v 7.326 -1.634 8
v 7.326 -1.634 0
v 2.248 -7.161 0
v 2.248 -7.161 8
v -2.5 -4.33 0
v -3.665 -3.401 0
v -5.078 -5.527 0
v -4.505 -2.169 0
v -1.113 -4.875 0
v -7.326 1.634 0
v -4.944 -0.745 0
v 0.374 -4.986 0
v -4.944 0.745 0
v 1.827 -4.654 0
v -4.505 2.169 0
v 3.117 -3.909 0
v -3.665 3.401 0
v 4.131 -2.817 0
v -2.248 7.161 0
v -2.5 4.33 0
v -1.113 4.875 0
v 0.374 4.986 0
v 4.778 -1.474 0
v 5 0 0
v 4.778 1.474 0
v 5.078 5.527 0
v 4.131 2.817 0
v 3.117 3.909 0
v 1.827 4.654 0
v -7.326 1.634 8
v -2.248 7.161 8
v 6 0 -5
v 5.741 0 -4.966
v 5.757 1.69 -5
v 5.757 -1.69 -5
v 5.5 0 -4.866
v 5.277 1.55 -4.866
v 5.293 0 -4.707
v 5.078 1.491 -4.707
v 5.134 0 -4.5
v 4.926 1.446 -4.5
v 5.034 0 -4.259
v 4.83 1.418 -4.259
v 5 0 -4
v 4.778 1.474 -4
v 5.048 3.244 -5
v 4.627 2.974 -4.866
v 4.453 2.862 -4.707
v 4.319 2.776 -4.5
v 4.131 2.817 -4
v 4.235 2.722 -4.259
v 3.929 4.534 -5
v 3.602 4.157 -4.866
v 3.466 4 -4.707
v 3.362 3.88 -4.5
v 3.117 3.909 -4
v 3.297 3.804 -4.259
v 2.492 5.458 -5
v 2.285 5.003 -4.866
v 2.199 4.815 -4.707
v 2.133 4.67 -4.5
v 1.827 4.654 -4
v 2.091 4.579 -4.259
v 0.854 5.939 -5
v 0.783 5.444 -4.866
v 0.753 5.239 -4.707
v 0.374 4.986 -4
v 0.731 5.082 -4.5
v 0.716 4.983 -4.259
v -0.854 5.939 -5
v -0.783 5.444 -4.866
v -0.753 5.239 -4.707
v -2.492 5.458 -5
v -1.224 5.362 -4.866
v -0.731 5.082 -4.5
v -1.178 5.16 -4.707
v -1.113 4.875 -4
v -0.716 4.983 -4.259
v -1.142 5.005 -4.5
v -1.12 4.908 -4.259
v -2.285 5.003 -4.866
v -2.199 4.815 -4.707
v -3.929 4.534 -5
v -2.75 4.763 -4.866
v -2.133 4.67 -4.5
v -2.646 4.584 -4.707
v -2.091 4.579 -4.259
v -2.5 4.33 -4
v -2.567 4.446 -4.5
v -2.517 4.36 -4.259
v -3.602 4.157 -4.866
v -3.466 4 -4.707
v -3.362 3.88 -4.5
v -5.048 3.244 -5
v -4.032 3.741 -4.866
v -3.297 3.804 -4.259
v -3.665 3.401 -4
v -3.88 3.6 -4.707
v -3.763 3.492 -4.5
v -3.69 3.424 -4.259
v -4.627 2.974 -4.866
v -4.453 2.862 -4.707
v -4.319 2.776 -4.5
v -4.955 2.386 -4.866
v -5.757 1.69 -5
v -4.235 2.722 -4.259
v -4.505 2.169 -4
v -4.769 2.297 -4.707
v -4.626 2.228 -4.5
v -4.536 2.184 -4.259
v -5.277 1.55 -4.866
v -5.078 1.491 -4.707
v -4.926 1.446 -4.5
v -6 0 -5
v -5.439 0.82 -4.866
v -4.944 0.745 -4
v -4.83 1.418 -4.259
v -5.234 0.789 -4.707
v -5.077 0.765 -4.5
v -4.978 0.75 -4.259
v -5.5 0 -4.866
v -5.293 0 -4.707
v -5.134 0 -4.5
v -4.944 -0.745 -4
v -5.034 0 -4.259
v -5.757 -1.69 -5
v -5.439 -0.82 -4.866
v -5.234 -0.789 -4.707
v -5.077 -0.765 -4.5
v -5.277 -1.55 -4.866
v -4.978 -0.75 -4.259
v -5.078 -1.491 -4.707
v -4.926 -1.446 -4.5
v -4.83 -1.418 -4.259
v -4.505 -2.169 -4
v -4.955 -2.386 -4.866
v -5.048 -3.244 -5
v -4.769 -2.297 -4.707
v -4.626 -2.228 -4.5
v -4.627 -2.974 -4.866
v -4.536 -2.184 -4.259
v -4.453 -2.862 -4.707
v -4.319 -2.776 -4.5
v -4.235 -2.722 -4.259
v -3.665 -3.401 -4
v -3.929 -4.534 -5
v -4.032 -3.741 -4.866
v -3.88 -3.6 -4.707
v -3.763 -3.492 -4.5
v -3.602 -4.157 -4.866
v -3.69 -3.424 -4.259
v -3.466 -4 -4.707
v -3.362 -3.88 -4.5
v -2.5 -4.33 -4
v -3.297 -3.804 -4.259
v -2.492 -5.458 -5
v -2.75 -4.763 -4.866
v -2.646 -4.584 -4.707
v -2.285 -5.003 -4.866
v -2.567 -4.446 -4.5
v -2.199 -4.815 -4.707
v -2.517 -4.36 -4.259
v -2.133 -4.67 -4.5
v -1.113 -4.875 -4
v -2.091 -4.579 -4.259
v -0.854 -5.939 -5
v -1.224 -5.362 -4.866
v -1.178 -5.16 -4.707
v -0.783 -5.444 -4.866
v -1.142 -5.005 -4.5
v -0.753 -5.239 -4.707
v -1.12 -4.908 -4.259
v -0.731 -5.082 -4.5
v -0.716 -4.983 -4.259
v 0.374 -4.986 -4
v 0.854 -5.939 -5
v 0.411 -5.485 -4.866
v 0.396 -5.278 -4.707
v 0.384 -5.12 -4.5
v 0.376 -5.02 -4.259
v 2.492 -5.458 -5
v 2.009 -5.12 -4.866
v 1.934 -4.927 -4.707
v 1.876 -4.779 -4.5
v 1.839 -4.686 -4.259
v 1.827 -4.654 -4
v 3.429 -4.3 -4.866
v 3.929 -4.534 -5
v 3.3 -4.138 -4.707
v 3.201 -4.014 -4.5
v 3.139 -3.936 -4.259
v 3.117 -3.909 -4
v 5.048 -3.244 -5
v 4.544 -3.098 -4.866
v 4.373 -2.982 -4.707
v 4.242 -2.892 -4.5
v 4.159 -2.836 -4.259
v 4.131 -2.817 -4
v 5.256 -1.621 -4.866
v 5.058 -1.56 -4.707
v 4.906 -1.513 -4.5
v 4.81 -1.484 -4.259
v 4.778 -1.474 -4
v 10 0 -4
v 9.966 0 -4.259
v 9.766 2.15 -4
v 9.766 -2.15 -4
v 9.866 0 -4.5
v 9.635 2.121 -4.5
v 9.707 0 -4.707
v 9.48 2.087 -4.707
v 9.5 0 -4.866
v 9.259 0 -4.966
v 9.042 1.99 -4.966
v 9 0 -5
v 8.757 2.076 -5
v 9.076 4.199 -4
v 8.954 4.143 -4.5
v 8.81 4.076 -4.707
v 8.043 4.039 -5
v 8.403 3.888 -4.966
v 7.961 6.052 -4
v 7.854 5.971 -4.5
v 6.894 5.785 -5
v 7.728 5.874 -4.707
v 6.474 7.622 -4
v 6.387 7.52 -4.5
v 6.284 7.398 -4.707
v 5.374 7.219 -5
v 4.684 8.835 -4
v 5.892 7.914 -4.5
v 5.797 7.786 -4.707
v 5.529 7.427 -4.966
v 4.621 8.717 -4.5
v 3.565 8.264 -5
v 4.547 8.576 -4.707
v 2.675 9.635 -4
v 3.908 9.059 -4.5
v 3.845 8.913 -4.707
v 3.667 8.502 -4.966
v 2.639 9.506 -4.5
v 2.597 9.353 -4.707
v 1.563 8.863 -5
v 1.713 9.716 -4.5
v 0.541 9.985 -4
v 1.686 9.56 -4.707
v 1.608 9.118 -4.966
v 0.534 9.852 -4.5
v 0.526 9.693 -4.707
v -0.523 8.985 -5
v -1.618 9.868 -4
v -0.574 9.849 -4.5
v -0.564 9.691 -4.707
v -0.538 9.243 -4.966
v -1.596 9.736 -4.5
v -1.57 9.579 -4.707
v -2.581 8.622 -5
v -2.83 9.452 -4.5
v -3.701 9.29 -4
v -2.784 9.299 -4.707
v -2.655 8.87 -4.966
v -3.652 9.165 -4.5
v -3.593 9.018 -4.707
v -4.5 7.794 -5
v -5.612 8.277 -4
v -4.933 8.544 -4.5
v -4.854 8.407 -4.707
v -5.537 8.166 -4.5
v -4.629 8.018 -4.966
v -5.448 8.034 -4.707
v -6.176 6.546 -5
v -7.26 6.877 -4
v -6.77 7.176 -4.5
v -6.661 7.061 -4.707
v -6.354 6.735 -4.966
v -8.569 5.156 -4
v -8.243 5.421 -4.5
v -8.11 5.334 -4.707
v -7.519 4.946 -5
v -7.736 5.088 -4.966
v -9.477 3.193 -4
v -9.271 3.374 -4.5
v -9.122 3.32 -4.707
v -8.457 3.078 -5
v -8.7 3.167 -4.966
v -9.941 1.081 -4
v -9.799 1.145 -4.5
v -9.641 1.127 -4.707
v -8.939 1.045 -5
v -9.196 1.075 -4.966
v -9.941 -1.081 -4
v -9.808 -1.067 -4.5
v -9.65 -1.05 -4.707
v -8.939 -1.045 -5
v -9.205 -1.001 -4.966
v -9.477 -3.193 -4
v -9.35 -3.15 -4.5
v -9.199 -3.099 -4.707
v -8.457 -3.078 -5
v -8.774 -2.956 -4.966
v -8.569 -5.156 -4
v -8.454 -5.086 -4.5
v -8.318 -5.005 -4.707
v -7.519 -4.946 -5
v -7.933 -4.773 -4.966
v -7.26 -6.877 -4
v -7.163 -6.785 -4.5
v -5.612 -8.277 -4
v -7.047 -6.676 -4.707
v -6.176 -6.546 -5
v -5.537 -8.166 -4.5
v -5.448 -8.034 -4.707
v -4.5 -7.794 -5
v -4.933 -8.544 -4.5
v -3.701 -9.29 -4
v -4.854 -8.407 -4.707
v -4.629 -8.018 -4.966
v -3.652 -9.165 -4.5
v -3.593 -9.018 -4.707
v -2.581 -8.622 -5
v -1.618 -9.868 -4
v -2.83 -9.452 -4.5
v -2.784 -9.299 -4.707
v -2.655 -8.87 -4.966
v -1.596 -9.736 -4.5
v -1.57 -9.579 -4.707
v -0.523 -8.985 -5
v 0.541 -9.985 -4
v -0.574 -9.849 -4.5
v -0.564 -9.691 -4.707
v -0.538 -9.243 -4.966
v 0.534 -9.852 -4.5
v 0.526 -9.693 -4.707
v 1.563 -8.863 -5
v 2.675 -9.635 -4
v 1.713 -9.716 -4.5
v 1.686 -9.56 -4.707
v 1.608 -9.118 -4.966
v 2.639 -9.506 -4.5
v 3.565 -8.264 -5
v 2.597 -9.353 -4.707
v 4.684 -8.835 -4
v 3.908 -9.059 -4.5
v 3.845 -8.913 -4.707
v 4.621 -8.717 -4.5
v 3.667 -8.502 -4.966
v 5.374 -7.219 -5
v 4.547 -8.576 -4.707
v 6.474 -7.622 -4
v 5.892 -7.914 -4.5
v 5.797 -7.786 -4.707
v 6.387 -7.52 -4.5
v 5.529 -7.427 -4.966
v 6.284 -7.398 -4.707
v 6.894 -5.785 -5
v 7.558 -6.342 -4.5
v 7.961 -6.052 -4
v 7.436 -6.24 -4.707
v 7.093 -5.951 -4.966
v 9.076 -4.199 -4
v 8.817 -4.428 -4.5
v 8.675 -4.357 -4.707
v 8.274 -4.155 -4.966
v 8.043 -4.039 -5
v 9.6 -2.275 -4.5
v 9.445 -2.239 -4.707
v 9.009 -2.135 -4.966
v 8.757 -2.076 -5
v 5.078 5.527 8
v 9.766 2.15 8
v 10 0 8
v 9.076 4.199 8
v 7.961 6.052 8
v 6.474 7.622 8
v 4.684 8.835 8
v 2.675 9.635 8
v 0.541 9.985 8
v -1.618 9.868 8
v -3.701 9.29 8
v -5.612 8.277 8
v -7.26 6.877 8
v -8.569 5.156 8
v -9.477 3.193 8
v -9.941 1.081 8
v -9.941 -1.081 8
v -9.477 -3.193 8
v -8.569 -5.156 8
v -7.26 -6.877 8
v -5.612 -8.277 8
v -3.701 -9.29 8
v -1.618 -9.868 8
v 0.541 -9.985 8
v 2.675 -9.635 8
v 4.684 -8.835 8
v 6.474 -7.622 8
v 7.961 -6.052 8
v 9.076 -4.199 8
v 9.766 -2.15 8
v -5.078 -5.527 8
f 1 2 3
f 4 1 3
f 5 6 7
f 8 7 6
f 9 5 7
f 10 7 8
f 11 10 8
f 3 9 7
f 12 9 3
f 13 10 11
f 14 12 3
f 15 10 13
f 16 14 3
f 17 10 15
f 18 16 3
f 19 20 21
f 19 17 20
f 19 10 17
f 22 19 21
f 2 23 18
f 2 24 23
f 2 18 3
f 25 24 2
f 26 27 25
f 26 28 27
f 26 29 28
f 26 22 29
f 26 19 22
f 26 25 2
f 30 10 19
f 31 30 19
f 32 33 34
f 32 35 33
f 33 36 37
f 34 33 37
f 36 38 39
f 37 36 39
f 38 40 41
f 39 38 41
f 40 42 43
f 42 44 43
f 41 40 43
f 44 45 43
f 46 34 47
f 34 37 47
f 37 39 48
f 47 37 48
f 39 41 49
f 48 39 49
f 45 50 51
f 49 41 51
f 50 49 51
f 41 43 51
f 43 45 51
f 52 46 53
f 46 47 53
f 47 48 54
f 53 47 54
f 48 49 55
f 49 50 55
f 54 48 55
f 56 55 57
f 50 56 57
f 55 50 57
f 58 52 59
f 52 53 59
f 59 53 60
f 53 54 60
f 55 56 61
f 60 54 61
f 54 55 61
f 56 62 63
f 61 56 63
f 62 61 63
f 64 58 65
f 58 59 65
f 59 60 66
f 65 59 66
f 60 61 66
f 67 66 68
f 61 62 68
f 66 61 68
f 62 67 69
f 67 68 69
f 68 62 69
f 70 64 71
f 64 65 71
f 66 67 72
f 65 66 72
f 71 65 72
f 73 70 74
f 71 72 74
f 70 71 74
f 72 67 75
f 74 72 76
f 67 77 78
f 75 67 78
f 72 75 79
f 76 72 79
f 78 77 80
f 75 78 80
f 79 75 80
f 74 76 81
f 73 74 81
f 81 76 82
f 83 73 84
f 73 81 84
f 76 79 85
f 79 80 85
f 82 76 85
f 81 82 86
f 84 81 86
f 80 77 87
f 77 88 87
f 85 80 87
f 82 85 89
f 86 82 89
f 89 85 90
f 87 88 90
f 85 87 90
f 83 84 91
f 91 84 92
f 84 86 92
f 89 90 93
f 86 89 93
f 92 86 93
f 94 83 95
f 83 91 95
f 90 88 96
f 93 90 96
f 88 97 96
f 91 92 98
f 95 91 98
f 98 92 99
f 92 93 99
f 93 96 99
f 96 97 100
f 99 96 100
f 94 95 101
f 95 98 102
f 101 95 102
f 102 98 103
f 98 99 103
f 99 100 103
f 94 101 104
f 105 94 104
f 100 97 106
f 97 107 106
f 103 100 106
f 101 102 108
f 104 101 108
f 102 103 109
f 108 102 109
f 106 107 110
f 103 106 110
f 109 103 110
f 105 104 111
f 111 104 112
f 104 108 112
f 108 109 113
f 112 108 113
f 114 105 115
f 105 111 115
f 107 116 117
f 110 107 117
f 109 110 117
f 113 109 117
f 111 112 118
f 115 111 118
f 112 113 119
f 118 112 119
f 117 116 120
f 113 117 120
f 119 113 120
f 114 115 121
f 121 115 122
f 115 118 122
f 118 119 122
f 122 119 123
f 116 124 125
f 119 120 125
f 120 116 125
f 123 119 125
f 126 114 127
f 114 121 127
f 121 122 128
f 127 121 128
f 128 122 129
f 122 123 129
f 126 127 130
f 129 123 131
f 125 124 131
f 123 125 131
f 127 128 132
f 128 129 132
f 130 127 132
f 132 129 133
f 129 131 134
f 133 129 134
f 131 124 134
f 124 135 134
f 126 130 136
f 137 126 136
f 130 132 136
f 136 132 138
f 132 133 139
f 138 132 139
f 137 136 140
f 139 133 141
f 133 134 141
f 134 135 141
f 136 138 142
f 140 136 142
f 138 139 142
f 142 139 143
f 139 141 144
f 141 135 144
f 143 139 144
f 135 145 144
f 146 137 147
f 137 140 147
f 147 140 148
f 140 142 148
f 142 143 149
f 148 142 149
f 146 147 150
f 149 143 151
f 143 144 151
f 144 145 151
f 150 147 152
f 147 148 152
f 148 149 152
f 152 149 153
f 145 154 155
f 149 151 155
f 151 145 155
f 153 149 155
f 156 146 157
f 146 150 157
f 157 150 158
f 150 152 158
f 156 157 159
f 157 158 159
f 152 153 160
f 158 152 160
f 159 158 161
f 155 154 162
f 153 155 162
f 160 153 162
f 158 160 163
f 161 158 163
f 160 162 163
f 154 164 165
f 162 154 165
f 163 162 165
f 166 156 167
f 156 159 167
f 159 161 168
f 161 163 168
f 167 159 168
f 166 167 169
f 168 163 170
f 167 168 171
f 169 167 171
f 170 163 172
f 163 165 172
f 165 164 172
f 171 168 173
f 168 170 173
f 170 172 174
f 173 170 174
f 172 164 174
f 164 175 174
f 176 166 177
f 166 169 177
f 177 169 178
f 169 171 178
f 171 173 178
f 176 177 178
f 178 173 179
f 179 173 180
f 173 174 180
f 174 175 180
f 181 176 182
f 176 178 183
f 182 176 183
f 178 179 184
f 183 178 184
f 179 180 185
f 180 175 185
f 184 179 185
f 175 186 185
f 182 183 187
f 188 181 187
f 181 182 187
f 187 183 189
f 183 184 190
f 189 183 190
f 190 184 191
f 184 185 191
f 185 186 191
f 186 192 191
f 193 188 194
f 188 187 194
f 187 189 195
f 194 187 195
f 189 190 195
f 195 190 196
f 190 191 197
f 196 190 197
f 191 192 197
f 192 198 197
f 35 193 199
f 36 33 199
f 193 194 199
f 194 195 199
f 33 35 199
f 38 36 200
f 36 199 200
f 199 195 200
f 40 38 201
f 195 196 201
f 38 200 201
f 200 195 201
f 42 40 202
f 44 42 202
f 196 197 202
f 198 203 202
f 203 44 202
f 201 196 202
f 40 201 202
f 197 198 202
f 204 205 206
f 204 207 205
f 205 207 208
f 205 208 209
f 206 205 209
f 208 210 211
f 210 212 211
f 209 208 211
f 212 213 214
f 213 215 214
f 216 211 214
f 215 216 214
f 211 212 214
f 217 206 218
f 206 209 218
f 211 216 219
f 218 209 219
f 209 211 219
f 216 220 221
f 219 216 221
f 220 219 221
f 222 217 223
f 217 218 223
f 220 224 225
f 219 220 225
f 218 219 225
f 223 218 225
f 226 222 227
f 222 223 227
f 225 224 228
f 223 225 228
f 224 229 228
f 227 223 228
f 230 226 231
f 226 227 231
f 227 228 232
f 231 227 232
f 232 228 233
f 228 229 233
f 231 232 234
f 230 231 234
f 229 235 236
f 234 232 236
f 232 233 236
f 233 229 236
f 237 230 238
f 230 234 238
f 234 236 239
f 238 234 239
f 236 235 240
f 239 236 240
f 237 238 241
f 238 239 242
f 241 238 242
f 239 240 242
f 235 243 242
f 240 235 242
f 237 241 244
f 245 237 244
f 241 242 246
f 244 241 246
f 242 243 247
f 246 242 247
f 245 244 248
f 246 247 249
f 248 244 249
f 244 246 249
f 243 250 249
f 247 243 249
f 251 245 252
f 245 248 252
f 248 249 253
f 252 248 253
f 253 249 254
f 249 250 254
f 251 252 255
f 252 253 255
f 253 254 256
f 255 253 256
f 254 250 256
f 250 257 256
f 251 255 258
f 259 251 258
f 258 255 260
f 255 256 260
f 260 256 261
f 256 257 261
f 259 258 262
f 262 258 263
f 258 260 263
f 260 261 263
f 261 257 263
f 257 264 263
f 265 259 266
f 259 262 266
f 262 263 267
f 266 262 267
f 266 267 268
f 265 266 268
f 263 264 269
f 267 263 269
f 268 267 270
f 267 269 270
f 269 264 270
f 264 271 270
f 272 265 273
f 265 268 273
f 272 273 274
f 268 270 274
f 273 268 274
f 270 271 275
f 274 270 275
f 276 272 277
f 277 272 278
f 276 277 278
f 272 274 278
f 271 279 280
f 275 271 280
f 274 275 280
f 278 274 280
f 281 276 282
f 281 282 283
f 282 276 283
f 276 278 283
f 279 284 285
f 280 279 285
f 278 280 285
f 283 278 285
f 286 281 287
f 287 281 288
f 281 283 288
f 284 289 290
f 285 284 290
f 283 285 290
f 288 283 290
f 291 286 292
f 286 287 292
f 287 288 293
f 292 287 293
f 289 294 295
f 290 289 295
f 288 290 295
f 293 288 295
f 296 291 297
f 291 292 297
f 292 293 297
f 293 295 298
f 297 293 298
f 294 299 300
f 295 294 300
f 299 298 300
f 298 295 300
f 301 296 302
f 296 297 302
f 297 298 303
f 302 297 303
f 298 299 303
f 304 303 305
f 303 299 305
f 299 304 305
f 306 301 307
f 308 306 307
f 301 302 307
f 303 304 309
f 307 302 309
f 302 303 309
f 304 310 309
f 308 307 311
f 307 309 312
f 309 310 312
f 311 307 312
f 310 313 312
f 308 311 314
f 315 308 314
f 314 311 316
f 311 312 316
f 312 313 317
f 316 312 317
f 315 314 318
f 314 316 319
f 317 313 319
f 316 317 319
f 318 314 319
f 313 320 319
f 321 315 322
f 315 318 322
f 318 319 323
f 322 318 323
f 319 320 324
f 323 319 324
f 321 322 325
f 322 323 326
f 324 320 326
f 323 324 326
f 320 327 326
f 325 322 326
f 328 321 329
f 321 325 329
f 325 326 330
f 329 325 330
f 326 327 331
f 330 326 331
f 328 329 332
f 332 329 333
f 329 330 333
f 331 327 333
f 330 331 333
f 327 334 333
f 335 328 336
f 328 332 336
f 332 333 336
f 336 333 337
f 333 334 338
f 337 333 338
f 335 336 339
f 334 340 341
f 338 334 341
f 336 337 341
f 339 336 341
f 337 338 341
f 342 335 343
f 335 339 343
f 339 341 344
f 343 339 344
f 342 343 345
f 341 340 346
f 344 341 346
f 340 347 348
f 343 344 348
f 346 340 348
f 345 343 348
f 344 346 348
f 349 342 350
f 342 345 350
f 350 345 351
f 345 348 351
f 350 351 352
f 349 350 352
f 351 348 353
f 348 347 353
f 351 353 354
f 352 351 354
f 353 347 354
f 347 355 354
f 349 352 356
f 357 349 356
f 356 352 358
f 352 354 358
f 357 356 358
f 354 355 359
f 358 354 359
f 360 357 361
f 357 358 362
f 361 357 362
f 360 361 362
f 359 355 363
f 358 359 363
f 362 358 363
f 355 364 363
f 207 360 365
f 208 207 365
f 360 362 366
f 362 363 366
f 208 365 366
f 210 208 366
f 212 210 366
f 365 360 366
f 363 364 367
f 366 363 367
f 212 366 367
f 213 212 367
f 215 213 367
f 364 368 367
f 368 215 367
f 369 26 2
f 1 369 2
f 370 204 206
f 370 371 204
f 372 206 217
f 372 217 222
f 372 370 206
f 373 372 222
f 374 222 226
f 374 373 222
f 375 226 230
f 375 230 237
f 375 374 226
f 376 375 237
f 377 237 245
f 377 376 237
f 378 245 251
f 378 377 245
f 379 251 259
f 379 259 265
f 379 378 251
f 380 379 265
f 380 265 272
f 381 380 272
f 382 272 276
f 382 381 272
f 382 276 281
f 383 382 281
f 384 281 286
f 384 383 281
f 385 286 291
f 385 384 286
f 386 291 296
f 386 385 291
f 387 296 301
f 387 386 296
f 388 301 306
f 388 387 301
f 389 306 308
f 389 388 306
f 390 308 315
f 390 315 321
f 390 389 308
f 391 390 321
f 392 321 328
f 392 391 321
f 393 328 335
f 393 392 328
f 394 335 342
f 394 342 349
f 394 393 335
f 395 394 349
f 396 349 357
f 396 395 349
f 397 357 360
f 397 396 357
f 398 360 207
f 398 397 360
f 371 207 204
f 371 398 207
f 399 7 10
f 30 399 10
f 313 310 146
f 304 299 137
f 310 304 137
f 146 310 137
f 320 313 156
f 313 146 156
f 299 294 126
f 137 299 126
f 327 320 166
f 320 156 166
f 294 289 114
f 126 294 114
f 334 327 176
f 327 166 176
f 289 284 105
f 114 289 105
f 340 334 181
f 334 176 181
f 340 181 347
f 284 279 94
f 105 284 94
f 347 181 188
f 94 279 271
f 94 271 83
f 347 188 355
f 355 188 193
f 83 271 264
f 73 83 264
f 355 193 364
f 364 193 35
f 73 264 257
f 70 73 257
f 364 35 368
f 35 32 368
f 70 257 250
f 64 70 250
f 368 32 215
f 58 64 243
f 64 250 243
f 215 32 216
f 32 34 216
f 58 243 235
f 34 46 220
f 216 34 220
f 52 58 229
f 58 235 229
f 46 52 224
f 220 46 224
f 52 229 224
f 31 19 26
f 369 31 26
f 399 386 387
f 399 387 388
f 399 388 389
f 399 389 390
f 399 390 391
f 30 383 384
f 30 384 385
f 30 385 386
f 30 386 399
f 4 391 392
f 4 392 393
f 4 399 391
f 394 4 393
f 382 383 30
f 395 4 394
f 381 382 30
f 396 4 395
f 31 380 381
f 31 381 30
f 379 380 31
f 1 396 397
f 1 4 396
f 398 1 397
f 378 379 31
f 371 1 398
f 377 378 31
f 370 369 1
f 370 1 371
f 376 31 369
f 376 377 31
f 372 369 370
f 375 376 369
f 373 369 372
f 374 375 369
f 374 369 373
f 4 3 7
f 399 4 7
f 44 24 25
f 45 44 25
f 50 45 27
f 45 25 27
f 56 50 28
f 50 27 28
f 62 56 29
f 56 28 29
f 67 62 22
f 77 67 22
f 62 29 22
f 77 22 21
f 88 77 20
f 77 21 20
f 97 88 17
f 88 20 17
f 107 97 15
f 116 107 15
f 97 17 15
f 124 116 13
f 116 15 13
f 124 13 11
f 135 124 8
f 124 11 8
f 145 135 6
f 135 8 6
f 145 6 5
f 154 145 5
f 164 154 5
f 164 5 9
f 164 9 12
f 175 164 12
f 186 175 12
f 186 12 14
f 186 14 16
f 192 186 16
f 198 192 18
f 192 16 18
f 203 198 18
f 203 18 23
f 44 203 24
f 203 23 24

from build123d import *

# Parameters (mm, degrees)
F0_R     = 10
F0_R_2   = 5
F1_DEPTH = 5
F2_DEPTH = 8
F3_R     = 1


with BuildPart() as f1:
    # F0 (on Top) → F1 (new body)
    with BuildSketch(Plane.XY):
        Circle(F0_R)
        Polygon((-7.325631, 1.633545), (-2.248124, 7.160955), (5.077507, 5.52741), (7.325631, -1.633545), (2.248124, -7.160955), (-5.077507, -5.52741), align=None, mode=Mode.SUBTRACT)
        Polygon((5.077507, 5.52741), (-2.248124, 7.160955), (-7.325631, 1.633545), (-5.077507, -5.52741), (2.248124, -7.160955), (7.325631, -1.633545), align=None)
        Circle(F0_R_2, mode=Mode.SUBTRACT)
    extrude(amount=-F1_DEPTH)

    # F0 (on Top) → F2 (join)
    with BuildSketch(Plane.XY):
        Circle(F0_R)
        Polygon((-7.325631, 1.633545), (-2.248124, 7.160955), (5.077507, 5.52741), (7.325631, -1.633545), (2.248124, -7.160955), (-5.077507, -5.52741), align=None, mode=Mode.SUBTRACT)
    extrude(amount=F2_DEPTH)

    # F3
    f3_edges = [f1.edges().sort_by_distance(p)[0] for p in [
        (-10, 0, -5),
        (-5, 0, -5),
    ]]
    fillet(f3_edges, radius=F3_R)


solid = f1.part
